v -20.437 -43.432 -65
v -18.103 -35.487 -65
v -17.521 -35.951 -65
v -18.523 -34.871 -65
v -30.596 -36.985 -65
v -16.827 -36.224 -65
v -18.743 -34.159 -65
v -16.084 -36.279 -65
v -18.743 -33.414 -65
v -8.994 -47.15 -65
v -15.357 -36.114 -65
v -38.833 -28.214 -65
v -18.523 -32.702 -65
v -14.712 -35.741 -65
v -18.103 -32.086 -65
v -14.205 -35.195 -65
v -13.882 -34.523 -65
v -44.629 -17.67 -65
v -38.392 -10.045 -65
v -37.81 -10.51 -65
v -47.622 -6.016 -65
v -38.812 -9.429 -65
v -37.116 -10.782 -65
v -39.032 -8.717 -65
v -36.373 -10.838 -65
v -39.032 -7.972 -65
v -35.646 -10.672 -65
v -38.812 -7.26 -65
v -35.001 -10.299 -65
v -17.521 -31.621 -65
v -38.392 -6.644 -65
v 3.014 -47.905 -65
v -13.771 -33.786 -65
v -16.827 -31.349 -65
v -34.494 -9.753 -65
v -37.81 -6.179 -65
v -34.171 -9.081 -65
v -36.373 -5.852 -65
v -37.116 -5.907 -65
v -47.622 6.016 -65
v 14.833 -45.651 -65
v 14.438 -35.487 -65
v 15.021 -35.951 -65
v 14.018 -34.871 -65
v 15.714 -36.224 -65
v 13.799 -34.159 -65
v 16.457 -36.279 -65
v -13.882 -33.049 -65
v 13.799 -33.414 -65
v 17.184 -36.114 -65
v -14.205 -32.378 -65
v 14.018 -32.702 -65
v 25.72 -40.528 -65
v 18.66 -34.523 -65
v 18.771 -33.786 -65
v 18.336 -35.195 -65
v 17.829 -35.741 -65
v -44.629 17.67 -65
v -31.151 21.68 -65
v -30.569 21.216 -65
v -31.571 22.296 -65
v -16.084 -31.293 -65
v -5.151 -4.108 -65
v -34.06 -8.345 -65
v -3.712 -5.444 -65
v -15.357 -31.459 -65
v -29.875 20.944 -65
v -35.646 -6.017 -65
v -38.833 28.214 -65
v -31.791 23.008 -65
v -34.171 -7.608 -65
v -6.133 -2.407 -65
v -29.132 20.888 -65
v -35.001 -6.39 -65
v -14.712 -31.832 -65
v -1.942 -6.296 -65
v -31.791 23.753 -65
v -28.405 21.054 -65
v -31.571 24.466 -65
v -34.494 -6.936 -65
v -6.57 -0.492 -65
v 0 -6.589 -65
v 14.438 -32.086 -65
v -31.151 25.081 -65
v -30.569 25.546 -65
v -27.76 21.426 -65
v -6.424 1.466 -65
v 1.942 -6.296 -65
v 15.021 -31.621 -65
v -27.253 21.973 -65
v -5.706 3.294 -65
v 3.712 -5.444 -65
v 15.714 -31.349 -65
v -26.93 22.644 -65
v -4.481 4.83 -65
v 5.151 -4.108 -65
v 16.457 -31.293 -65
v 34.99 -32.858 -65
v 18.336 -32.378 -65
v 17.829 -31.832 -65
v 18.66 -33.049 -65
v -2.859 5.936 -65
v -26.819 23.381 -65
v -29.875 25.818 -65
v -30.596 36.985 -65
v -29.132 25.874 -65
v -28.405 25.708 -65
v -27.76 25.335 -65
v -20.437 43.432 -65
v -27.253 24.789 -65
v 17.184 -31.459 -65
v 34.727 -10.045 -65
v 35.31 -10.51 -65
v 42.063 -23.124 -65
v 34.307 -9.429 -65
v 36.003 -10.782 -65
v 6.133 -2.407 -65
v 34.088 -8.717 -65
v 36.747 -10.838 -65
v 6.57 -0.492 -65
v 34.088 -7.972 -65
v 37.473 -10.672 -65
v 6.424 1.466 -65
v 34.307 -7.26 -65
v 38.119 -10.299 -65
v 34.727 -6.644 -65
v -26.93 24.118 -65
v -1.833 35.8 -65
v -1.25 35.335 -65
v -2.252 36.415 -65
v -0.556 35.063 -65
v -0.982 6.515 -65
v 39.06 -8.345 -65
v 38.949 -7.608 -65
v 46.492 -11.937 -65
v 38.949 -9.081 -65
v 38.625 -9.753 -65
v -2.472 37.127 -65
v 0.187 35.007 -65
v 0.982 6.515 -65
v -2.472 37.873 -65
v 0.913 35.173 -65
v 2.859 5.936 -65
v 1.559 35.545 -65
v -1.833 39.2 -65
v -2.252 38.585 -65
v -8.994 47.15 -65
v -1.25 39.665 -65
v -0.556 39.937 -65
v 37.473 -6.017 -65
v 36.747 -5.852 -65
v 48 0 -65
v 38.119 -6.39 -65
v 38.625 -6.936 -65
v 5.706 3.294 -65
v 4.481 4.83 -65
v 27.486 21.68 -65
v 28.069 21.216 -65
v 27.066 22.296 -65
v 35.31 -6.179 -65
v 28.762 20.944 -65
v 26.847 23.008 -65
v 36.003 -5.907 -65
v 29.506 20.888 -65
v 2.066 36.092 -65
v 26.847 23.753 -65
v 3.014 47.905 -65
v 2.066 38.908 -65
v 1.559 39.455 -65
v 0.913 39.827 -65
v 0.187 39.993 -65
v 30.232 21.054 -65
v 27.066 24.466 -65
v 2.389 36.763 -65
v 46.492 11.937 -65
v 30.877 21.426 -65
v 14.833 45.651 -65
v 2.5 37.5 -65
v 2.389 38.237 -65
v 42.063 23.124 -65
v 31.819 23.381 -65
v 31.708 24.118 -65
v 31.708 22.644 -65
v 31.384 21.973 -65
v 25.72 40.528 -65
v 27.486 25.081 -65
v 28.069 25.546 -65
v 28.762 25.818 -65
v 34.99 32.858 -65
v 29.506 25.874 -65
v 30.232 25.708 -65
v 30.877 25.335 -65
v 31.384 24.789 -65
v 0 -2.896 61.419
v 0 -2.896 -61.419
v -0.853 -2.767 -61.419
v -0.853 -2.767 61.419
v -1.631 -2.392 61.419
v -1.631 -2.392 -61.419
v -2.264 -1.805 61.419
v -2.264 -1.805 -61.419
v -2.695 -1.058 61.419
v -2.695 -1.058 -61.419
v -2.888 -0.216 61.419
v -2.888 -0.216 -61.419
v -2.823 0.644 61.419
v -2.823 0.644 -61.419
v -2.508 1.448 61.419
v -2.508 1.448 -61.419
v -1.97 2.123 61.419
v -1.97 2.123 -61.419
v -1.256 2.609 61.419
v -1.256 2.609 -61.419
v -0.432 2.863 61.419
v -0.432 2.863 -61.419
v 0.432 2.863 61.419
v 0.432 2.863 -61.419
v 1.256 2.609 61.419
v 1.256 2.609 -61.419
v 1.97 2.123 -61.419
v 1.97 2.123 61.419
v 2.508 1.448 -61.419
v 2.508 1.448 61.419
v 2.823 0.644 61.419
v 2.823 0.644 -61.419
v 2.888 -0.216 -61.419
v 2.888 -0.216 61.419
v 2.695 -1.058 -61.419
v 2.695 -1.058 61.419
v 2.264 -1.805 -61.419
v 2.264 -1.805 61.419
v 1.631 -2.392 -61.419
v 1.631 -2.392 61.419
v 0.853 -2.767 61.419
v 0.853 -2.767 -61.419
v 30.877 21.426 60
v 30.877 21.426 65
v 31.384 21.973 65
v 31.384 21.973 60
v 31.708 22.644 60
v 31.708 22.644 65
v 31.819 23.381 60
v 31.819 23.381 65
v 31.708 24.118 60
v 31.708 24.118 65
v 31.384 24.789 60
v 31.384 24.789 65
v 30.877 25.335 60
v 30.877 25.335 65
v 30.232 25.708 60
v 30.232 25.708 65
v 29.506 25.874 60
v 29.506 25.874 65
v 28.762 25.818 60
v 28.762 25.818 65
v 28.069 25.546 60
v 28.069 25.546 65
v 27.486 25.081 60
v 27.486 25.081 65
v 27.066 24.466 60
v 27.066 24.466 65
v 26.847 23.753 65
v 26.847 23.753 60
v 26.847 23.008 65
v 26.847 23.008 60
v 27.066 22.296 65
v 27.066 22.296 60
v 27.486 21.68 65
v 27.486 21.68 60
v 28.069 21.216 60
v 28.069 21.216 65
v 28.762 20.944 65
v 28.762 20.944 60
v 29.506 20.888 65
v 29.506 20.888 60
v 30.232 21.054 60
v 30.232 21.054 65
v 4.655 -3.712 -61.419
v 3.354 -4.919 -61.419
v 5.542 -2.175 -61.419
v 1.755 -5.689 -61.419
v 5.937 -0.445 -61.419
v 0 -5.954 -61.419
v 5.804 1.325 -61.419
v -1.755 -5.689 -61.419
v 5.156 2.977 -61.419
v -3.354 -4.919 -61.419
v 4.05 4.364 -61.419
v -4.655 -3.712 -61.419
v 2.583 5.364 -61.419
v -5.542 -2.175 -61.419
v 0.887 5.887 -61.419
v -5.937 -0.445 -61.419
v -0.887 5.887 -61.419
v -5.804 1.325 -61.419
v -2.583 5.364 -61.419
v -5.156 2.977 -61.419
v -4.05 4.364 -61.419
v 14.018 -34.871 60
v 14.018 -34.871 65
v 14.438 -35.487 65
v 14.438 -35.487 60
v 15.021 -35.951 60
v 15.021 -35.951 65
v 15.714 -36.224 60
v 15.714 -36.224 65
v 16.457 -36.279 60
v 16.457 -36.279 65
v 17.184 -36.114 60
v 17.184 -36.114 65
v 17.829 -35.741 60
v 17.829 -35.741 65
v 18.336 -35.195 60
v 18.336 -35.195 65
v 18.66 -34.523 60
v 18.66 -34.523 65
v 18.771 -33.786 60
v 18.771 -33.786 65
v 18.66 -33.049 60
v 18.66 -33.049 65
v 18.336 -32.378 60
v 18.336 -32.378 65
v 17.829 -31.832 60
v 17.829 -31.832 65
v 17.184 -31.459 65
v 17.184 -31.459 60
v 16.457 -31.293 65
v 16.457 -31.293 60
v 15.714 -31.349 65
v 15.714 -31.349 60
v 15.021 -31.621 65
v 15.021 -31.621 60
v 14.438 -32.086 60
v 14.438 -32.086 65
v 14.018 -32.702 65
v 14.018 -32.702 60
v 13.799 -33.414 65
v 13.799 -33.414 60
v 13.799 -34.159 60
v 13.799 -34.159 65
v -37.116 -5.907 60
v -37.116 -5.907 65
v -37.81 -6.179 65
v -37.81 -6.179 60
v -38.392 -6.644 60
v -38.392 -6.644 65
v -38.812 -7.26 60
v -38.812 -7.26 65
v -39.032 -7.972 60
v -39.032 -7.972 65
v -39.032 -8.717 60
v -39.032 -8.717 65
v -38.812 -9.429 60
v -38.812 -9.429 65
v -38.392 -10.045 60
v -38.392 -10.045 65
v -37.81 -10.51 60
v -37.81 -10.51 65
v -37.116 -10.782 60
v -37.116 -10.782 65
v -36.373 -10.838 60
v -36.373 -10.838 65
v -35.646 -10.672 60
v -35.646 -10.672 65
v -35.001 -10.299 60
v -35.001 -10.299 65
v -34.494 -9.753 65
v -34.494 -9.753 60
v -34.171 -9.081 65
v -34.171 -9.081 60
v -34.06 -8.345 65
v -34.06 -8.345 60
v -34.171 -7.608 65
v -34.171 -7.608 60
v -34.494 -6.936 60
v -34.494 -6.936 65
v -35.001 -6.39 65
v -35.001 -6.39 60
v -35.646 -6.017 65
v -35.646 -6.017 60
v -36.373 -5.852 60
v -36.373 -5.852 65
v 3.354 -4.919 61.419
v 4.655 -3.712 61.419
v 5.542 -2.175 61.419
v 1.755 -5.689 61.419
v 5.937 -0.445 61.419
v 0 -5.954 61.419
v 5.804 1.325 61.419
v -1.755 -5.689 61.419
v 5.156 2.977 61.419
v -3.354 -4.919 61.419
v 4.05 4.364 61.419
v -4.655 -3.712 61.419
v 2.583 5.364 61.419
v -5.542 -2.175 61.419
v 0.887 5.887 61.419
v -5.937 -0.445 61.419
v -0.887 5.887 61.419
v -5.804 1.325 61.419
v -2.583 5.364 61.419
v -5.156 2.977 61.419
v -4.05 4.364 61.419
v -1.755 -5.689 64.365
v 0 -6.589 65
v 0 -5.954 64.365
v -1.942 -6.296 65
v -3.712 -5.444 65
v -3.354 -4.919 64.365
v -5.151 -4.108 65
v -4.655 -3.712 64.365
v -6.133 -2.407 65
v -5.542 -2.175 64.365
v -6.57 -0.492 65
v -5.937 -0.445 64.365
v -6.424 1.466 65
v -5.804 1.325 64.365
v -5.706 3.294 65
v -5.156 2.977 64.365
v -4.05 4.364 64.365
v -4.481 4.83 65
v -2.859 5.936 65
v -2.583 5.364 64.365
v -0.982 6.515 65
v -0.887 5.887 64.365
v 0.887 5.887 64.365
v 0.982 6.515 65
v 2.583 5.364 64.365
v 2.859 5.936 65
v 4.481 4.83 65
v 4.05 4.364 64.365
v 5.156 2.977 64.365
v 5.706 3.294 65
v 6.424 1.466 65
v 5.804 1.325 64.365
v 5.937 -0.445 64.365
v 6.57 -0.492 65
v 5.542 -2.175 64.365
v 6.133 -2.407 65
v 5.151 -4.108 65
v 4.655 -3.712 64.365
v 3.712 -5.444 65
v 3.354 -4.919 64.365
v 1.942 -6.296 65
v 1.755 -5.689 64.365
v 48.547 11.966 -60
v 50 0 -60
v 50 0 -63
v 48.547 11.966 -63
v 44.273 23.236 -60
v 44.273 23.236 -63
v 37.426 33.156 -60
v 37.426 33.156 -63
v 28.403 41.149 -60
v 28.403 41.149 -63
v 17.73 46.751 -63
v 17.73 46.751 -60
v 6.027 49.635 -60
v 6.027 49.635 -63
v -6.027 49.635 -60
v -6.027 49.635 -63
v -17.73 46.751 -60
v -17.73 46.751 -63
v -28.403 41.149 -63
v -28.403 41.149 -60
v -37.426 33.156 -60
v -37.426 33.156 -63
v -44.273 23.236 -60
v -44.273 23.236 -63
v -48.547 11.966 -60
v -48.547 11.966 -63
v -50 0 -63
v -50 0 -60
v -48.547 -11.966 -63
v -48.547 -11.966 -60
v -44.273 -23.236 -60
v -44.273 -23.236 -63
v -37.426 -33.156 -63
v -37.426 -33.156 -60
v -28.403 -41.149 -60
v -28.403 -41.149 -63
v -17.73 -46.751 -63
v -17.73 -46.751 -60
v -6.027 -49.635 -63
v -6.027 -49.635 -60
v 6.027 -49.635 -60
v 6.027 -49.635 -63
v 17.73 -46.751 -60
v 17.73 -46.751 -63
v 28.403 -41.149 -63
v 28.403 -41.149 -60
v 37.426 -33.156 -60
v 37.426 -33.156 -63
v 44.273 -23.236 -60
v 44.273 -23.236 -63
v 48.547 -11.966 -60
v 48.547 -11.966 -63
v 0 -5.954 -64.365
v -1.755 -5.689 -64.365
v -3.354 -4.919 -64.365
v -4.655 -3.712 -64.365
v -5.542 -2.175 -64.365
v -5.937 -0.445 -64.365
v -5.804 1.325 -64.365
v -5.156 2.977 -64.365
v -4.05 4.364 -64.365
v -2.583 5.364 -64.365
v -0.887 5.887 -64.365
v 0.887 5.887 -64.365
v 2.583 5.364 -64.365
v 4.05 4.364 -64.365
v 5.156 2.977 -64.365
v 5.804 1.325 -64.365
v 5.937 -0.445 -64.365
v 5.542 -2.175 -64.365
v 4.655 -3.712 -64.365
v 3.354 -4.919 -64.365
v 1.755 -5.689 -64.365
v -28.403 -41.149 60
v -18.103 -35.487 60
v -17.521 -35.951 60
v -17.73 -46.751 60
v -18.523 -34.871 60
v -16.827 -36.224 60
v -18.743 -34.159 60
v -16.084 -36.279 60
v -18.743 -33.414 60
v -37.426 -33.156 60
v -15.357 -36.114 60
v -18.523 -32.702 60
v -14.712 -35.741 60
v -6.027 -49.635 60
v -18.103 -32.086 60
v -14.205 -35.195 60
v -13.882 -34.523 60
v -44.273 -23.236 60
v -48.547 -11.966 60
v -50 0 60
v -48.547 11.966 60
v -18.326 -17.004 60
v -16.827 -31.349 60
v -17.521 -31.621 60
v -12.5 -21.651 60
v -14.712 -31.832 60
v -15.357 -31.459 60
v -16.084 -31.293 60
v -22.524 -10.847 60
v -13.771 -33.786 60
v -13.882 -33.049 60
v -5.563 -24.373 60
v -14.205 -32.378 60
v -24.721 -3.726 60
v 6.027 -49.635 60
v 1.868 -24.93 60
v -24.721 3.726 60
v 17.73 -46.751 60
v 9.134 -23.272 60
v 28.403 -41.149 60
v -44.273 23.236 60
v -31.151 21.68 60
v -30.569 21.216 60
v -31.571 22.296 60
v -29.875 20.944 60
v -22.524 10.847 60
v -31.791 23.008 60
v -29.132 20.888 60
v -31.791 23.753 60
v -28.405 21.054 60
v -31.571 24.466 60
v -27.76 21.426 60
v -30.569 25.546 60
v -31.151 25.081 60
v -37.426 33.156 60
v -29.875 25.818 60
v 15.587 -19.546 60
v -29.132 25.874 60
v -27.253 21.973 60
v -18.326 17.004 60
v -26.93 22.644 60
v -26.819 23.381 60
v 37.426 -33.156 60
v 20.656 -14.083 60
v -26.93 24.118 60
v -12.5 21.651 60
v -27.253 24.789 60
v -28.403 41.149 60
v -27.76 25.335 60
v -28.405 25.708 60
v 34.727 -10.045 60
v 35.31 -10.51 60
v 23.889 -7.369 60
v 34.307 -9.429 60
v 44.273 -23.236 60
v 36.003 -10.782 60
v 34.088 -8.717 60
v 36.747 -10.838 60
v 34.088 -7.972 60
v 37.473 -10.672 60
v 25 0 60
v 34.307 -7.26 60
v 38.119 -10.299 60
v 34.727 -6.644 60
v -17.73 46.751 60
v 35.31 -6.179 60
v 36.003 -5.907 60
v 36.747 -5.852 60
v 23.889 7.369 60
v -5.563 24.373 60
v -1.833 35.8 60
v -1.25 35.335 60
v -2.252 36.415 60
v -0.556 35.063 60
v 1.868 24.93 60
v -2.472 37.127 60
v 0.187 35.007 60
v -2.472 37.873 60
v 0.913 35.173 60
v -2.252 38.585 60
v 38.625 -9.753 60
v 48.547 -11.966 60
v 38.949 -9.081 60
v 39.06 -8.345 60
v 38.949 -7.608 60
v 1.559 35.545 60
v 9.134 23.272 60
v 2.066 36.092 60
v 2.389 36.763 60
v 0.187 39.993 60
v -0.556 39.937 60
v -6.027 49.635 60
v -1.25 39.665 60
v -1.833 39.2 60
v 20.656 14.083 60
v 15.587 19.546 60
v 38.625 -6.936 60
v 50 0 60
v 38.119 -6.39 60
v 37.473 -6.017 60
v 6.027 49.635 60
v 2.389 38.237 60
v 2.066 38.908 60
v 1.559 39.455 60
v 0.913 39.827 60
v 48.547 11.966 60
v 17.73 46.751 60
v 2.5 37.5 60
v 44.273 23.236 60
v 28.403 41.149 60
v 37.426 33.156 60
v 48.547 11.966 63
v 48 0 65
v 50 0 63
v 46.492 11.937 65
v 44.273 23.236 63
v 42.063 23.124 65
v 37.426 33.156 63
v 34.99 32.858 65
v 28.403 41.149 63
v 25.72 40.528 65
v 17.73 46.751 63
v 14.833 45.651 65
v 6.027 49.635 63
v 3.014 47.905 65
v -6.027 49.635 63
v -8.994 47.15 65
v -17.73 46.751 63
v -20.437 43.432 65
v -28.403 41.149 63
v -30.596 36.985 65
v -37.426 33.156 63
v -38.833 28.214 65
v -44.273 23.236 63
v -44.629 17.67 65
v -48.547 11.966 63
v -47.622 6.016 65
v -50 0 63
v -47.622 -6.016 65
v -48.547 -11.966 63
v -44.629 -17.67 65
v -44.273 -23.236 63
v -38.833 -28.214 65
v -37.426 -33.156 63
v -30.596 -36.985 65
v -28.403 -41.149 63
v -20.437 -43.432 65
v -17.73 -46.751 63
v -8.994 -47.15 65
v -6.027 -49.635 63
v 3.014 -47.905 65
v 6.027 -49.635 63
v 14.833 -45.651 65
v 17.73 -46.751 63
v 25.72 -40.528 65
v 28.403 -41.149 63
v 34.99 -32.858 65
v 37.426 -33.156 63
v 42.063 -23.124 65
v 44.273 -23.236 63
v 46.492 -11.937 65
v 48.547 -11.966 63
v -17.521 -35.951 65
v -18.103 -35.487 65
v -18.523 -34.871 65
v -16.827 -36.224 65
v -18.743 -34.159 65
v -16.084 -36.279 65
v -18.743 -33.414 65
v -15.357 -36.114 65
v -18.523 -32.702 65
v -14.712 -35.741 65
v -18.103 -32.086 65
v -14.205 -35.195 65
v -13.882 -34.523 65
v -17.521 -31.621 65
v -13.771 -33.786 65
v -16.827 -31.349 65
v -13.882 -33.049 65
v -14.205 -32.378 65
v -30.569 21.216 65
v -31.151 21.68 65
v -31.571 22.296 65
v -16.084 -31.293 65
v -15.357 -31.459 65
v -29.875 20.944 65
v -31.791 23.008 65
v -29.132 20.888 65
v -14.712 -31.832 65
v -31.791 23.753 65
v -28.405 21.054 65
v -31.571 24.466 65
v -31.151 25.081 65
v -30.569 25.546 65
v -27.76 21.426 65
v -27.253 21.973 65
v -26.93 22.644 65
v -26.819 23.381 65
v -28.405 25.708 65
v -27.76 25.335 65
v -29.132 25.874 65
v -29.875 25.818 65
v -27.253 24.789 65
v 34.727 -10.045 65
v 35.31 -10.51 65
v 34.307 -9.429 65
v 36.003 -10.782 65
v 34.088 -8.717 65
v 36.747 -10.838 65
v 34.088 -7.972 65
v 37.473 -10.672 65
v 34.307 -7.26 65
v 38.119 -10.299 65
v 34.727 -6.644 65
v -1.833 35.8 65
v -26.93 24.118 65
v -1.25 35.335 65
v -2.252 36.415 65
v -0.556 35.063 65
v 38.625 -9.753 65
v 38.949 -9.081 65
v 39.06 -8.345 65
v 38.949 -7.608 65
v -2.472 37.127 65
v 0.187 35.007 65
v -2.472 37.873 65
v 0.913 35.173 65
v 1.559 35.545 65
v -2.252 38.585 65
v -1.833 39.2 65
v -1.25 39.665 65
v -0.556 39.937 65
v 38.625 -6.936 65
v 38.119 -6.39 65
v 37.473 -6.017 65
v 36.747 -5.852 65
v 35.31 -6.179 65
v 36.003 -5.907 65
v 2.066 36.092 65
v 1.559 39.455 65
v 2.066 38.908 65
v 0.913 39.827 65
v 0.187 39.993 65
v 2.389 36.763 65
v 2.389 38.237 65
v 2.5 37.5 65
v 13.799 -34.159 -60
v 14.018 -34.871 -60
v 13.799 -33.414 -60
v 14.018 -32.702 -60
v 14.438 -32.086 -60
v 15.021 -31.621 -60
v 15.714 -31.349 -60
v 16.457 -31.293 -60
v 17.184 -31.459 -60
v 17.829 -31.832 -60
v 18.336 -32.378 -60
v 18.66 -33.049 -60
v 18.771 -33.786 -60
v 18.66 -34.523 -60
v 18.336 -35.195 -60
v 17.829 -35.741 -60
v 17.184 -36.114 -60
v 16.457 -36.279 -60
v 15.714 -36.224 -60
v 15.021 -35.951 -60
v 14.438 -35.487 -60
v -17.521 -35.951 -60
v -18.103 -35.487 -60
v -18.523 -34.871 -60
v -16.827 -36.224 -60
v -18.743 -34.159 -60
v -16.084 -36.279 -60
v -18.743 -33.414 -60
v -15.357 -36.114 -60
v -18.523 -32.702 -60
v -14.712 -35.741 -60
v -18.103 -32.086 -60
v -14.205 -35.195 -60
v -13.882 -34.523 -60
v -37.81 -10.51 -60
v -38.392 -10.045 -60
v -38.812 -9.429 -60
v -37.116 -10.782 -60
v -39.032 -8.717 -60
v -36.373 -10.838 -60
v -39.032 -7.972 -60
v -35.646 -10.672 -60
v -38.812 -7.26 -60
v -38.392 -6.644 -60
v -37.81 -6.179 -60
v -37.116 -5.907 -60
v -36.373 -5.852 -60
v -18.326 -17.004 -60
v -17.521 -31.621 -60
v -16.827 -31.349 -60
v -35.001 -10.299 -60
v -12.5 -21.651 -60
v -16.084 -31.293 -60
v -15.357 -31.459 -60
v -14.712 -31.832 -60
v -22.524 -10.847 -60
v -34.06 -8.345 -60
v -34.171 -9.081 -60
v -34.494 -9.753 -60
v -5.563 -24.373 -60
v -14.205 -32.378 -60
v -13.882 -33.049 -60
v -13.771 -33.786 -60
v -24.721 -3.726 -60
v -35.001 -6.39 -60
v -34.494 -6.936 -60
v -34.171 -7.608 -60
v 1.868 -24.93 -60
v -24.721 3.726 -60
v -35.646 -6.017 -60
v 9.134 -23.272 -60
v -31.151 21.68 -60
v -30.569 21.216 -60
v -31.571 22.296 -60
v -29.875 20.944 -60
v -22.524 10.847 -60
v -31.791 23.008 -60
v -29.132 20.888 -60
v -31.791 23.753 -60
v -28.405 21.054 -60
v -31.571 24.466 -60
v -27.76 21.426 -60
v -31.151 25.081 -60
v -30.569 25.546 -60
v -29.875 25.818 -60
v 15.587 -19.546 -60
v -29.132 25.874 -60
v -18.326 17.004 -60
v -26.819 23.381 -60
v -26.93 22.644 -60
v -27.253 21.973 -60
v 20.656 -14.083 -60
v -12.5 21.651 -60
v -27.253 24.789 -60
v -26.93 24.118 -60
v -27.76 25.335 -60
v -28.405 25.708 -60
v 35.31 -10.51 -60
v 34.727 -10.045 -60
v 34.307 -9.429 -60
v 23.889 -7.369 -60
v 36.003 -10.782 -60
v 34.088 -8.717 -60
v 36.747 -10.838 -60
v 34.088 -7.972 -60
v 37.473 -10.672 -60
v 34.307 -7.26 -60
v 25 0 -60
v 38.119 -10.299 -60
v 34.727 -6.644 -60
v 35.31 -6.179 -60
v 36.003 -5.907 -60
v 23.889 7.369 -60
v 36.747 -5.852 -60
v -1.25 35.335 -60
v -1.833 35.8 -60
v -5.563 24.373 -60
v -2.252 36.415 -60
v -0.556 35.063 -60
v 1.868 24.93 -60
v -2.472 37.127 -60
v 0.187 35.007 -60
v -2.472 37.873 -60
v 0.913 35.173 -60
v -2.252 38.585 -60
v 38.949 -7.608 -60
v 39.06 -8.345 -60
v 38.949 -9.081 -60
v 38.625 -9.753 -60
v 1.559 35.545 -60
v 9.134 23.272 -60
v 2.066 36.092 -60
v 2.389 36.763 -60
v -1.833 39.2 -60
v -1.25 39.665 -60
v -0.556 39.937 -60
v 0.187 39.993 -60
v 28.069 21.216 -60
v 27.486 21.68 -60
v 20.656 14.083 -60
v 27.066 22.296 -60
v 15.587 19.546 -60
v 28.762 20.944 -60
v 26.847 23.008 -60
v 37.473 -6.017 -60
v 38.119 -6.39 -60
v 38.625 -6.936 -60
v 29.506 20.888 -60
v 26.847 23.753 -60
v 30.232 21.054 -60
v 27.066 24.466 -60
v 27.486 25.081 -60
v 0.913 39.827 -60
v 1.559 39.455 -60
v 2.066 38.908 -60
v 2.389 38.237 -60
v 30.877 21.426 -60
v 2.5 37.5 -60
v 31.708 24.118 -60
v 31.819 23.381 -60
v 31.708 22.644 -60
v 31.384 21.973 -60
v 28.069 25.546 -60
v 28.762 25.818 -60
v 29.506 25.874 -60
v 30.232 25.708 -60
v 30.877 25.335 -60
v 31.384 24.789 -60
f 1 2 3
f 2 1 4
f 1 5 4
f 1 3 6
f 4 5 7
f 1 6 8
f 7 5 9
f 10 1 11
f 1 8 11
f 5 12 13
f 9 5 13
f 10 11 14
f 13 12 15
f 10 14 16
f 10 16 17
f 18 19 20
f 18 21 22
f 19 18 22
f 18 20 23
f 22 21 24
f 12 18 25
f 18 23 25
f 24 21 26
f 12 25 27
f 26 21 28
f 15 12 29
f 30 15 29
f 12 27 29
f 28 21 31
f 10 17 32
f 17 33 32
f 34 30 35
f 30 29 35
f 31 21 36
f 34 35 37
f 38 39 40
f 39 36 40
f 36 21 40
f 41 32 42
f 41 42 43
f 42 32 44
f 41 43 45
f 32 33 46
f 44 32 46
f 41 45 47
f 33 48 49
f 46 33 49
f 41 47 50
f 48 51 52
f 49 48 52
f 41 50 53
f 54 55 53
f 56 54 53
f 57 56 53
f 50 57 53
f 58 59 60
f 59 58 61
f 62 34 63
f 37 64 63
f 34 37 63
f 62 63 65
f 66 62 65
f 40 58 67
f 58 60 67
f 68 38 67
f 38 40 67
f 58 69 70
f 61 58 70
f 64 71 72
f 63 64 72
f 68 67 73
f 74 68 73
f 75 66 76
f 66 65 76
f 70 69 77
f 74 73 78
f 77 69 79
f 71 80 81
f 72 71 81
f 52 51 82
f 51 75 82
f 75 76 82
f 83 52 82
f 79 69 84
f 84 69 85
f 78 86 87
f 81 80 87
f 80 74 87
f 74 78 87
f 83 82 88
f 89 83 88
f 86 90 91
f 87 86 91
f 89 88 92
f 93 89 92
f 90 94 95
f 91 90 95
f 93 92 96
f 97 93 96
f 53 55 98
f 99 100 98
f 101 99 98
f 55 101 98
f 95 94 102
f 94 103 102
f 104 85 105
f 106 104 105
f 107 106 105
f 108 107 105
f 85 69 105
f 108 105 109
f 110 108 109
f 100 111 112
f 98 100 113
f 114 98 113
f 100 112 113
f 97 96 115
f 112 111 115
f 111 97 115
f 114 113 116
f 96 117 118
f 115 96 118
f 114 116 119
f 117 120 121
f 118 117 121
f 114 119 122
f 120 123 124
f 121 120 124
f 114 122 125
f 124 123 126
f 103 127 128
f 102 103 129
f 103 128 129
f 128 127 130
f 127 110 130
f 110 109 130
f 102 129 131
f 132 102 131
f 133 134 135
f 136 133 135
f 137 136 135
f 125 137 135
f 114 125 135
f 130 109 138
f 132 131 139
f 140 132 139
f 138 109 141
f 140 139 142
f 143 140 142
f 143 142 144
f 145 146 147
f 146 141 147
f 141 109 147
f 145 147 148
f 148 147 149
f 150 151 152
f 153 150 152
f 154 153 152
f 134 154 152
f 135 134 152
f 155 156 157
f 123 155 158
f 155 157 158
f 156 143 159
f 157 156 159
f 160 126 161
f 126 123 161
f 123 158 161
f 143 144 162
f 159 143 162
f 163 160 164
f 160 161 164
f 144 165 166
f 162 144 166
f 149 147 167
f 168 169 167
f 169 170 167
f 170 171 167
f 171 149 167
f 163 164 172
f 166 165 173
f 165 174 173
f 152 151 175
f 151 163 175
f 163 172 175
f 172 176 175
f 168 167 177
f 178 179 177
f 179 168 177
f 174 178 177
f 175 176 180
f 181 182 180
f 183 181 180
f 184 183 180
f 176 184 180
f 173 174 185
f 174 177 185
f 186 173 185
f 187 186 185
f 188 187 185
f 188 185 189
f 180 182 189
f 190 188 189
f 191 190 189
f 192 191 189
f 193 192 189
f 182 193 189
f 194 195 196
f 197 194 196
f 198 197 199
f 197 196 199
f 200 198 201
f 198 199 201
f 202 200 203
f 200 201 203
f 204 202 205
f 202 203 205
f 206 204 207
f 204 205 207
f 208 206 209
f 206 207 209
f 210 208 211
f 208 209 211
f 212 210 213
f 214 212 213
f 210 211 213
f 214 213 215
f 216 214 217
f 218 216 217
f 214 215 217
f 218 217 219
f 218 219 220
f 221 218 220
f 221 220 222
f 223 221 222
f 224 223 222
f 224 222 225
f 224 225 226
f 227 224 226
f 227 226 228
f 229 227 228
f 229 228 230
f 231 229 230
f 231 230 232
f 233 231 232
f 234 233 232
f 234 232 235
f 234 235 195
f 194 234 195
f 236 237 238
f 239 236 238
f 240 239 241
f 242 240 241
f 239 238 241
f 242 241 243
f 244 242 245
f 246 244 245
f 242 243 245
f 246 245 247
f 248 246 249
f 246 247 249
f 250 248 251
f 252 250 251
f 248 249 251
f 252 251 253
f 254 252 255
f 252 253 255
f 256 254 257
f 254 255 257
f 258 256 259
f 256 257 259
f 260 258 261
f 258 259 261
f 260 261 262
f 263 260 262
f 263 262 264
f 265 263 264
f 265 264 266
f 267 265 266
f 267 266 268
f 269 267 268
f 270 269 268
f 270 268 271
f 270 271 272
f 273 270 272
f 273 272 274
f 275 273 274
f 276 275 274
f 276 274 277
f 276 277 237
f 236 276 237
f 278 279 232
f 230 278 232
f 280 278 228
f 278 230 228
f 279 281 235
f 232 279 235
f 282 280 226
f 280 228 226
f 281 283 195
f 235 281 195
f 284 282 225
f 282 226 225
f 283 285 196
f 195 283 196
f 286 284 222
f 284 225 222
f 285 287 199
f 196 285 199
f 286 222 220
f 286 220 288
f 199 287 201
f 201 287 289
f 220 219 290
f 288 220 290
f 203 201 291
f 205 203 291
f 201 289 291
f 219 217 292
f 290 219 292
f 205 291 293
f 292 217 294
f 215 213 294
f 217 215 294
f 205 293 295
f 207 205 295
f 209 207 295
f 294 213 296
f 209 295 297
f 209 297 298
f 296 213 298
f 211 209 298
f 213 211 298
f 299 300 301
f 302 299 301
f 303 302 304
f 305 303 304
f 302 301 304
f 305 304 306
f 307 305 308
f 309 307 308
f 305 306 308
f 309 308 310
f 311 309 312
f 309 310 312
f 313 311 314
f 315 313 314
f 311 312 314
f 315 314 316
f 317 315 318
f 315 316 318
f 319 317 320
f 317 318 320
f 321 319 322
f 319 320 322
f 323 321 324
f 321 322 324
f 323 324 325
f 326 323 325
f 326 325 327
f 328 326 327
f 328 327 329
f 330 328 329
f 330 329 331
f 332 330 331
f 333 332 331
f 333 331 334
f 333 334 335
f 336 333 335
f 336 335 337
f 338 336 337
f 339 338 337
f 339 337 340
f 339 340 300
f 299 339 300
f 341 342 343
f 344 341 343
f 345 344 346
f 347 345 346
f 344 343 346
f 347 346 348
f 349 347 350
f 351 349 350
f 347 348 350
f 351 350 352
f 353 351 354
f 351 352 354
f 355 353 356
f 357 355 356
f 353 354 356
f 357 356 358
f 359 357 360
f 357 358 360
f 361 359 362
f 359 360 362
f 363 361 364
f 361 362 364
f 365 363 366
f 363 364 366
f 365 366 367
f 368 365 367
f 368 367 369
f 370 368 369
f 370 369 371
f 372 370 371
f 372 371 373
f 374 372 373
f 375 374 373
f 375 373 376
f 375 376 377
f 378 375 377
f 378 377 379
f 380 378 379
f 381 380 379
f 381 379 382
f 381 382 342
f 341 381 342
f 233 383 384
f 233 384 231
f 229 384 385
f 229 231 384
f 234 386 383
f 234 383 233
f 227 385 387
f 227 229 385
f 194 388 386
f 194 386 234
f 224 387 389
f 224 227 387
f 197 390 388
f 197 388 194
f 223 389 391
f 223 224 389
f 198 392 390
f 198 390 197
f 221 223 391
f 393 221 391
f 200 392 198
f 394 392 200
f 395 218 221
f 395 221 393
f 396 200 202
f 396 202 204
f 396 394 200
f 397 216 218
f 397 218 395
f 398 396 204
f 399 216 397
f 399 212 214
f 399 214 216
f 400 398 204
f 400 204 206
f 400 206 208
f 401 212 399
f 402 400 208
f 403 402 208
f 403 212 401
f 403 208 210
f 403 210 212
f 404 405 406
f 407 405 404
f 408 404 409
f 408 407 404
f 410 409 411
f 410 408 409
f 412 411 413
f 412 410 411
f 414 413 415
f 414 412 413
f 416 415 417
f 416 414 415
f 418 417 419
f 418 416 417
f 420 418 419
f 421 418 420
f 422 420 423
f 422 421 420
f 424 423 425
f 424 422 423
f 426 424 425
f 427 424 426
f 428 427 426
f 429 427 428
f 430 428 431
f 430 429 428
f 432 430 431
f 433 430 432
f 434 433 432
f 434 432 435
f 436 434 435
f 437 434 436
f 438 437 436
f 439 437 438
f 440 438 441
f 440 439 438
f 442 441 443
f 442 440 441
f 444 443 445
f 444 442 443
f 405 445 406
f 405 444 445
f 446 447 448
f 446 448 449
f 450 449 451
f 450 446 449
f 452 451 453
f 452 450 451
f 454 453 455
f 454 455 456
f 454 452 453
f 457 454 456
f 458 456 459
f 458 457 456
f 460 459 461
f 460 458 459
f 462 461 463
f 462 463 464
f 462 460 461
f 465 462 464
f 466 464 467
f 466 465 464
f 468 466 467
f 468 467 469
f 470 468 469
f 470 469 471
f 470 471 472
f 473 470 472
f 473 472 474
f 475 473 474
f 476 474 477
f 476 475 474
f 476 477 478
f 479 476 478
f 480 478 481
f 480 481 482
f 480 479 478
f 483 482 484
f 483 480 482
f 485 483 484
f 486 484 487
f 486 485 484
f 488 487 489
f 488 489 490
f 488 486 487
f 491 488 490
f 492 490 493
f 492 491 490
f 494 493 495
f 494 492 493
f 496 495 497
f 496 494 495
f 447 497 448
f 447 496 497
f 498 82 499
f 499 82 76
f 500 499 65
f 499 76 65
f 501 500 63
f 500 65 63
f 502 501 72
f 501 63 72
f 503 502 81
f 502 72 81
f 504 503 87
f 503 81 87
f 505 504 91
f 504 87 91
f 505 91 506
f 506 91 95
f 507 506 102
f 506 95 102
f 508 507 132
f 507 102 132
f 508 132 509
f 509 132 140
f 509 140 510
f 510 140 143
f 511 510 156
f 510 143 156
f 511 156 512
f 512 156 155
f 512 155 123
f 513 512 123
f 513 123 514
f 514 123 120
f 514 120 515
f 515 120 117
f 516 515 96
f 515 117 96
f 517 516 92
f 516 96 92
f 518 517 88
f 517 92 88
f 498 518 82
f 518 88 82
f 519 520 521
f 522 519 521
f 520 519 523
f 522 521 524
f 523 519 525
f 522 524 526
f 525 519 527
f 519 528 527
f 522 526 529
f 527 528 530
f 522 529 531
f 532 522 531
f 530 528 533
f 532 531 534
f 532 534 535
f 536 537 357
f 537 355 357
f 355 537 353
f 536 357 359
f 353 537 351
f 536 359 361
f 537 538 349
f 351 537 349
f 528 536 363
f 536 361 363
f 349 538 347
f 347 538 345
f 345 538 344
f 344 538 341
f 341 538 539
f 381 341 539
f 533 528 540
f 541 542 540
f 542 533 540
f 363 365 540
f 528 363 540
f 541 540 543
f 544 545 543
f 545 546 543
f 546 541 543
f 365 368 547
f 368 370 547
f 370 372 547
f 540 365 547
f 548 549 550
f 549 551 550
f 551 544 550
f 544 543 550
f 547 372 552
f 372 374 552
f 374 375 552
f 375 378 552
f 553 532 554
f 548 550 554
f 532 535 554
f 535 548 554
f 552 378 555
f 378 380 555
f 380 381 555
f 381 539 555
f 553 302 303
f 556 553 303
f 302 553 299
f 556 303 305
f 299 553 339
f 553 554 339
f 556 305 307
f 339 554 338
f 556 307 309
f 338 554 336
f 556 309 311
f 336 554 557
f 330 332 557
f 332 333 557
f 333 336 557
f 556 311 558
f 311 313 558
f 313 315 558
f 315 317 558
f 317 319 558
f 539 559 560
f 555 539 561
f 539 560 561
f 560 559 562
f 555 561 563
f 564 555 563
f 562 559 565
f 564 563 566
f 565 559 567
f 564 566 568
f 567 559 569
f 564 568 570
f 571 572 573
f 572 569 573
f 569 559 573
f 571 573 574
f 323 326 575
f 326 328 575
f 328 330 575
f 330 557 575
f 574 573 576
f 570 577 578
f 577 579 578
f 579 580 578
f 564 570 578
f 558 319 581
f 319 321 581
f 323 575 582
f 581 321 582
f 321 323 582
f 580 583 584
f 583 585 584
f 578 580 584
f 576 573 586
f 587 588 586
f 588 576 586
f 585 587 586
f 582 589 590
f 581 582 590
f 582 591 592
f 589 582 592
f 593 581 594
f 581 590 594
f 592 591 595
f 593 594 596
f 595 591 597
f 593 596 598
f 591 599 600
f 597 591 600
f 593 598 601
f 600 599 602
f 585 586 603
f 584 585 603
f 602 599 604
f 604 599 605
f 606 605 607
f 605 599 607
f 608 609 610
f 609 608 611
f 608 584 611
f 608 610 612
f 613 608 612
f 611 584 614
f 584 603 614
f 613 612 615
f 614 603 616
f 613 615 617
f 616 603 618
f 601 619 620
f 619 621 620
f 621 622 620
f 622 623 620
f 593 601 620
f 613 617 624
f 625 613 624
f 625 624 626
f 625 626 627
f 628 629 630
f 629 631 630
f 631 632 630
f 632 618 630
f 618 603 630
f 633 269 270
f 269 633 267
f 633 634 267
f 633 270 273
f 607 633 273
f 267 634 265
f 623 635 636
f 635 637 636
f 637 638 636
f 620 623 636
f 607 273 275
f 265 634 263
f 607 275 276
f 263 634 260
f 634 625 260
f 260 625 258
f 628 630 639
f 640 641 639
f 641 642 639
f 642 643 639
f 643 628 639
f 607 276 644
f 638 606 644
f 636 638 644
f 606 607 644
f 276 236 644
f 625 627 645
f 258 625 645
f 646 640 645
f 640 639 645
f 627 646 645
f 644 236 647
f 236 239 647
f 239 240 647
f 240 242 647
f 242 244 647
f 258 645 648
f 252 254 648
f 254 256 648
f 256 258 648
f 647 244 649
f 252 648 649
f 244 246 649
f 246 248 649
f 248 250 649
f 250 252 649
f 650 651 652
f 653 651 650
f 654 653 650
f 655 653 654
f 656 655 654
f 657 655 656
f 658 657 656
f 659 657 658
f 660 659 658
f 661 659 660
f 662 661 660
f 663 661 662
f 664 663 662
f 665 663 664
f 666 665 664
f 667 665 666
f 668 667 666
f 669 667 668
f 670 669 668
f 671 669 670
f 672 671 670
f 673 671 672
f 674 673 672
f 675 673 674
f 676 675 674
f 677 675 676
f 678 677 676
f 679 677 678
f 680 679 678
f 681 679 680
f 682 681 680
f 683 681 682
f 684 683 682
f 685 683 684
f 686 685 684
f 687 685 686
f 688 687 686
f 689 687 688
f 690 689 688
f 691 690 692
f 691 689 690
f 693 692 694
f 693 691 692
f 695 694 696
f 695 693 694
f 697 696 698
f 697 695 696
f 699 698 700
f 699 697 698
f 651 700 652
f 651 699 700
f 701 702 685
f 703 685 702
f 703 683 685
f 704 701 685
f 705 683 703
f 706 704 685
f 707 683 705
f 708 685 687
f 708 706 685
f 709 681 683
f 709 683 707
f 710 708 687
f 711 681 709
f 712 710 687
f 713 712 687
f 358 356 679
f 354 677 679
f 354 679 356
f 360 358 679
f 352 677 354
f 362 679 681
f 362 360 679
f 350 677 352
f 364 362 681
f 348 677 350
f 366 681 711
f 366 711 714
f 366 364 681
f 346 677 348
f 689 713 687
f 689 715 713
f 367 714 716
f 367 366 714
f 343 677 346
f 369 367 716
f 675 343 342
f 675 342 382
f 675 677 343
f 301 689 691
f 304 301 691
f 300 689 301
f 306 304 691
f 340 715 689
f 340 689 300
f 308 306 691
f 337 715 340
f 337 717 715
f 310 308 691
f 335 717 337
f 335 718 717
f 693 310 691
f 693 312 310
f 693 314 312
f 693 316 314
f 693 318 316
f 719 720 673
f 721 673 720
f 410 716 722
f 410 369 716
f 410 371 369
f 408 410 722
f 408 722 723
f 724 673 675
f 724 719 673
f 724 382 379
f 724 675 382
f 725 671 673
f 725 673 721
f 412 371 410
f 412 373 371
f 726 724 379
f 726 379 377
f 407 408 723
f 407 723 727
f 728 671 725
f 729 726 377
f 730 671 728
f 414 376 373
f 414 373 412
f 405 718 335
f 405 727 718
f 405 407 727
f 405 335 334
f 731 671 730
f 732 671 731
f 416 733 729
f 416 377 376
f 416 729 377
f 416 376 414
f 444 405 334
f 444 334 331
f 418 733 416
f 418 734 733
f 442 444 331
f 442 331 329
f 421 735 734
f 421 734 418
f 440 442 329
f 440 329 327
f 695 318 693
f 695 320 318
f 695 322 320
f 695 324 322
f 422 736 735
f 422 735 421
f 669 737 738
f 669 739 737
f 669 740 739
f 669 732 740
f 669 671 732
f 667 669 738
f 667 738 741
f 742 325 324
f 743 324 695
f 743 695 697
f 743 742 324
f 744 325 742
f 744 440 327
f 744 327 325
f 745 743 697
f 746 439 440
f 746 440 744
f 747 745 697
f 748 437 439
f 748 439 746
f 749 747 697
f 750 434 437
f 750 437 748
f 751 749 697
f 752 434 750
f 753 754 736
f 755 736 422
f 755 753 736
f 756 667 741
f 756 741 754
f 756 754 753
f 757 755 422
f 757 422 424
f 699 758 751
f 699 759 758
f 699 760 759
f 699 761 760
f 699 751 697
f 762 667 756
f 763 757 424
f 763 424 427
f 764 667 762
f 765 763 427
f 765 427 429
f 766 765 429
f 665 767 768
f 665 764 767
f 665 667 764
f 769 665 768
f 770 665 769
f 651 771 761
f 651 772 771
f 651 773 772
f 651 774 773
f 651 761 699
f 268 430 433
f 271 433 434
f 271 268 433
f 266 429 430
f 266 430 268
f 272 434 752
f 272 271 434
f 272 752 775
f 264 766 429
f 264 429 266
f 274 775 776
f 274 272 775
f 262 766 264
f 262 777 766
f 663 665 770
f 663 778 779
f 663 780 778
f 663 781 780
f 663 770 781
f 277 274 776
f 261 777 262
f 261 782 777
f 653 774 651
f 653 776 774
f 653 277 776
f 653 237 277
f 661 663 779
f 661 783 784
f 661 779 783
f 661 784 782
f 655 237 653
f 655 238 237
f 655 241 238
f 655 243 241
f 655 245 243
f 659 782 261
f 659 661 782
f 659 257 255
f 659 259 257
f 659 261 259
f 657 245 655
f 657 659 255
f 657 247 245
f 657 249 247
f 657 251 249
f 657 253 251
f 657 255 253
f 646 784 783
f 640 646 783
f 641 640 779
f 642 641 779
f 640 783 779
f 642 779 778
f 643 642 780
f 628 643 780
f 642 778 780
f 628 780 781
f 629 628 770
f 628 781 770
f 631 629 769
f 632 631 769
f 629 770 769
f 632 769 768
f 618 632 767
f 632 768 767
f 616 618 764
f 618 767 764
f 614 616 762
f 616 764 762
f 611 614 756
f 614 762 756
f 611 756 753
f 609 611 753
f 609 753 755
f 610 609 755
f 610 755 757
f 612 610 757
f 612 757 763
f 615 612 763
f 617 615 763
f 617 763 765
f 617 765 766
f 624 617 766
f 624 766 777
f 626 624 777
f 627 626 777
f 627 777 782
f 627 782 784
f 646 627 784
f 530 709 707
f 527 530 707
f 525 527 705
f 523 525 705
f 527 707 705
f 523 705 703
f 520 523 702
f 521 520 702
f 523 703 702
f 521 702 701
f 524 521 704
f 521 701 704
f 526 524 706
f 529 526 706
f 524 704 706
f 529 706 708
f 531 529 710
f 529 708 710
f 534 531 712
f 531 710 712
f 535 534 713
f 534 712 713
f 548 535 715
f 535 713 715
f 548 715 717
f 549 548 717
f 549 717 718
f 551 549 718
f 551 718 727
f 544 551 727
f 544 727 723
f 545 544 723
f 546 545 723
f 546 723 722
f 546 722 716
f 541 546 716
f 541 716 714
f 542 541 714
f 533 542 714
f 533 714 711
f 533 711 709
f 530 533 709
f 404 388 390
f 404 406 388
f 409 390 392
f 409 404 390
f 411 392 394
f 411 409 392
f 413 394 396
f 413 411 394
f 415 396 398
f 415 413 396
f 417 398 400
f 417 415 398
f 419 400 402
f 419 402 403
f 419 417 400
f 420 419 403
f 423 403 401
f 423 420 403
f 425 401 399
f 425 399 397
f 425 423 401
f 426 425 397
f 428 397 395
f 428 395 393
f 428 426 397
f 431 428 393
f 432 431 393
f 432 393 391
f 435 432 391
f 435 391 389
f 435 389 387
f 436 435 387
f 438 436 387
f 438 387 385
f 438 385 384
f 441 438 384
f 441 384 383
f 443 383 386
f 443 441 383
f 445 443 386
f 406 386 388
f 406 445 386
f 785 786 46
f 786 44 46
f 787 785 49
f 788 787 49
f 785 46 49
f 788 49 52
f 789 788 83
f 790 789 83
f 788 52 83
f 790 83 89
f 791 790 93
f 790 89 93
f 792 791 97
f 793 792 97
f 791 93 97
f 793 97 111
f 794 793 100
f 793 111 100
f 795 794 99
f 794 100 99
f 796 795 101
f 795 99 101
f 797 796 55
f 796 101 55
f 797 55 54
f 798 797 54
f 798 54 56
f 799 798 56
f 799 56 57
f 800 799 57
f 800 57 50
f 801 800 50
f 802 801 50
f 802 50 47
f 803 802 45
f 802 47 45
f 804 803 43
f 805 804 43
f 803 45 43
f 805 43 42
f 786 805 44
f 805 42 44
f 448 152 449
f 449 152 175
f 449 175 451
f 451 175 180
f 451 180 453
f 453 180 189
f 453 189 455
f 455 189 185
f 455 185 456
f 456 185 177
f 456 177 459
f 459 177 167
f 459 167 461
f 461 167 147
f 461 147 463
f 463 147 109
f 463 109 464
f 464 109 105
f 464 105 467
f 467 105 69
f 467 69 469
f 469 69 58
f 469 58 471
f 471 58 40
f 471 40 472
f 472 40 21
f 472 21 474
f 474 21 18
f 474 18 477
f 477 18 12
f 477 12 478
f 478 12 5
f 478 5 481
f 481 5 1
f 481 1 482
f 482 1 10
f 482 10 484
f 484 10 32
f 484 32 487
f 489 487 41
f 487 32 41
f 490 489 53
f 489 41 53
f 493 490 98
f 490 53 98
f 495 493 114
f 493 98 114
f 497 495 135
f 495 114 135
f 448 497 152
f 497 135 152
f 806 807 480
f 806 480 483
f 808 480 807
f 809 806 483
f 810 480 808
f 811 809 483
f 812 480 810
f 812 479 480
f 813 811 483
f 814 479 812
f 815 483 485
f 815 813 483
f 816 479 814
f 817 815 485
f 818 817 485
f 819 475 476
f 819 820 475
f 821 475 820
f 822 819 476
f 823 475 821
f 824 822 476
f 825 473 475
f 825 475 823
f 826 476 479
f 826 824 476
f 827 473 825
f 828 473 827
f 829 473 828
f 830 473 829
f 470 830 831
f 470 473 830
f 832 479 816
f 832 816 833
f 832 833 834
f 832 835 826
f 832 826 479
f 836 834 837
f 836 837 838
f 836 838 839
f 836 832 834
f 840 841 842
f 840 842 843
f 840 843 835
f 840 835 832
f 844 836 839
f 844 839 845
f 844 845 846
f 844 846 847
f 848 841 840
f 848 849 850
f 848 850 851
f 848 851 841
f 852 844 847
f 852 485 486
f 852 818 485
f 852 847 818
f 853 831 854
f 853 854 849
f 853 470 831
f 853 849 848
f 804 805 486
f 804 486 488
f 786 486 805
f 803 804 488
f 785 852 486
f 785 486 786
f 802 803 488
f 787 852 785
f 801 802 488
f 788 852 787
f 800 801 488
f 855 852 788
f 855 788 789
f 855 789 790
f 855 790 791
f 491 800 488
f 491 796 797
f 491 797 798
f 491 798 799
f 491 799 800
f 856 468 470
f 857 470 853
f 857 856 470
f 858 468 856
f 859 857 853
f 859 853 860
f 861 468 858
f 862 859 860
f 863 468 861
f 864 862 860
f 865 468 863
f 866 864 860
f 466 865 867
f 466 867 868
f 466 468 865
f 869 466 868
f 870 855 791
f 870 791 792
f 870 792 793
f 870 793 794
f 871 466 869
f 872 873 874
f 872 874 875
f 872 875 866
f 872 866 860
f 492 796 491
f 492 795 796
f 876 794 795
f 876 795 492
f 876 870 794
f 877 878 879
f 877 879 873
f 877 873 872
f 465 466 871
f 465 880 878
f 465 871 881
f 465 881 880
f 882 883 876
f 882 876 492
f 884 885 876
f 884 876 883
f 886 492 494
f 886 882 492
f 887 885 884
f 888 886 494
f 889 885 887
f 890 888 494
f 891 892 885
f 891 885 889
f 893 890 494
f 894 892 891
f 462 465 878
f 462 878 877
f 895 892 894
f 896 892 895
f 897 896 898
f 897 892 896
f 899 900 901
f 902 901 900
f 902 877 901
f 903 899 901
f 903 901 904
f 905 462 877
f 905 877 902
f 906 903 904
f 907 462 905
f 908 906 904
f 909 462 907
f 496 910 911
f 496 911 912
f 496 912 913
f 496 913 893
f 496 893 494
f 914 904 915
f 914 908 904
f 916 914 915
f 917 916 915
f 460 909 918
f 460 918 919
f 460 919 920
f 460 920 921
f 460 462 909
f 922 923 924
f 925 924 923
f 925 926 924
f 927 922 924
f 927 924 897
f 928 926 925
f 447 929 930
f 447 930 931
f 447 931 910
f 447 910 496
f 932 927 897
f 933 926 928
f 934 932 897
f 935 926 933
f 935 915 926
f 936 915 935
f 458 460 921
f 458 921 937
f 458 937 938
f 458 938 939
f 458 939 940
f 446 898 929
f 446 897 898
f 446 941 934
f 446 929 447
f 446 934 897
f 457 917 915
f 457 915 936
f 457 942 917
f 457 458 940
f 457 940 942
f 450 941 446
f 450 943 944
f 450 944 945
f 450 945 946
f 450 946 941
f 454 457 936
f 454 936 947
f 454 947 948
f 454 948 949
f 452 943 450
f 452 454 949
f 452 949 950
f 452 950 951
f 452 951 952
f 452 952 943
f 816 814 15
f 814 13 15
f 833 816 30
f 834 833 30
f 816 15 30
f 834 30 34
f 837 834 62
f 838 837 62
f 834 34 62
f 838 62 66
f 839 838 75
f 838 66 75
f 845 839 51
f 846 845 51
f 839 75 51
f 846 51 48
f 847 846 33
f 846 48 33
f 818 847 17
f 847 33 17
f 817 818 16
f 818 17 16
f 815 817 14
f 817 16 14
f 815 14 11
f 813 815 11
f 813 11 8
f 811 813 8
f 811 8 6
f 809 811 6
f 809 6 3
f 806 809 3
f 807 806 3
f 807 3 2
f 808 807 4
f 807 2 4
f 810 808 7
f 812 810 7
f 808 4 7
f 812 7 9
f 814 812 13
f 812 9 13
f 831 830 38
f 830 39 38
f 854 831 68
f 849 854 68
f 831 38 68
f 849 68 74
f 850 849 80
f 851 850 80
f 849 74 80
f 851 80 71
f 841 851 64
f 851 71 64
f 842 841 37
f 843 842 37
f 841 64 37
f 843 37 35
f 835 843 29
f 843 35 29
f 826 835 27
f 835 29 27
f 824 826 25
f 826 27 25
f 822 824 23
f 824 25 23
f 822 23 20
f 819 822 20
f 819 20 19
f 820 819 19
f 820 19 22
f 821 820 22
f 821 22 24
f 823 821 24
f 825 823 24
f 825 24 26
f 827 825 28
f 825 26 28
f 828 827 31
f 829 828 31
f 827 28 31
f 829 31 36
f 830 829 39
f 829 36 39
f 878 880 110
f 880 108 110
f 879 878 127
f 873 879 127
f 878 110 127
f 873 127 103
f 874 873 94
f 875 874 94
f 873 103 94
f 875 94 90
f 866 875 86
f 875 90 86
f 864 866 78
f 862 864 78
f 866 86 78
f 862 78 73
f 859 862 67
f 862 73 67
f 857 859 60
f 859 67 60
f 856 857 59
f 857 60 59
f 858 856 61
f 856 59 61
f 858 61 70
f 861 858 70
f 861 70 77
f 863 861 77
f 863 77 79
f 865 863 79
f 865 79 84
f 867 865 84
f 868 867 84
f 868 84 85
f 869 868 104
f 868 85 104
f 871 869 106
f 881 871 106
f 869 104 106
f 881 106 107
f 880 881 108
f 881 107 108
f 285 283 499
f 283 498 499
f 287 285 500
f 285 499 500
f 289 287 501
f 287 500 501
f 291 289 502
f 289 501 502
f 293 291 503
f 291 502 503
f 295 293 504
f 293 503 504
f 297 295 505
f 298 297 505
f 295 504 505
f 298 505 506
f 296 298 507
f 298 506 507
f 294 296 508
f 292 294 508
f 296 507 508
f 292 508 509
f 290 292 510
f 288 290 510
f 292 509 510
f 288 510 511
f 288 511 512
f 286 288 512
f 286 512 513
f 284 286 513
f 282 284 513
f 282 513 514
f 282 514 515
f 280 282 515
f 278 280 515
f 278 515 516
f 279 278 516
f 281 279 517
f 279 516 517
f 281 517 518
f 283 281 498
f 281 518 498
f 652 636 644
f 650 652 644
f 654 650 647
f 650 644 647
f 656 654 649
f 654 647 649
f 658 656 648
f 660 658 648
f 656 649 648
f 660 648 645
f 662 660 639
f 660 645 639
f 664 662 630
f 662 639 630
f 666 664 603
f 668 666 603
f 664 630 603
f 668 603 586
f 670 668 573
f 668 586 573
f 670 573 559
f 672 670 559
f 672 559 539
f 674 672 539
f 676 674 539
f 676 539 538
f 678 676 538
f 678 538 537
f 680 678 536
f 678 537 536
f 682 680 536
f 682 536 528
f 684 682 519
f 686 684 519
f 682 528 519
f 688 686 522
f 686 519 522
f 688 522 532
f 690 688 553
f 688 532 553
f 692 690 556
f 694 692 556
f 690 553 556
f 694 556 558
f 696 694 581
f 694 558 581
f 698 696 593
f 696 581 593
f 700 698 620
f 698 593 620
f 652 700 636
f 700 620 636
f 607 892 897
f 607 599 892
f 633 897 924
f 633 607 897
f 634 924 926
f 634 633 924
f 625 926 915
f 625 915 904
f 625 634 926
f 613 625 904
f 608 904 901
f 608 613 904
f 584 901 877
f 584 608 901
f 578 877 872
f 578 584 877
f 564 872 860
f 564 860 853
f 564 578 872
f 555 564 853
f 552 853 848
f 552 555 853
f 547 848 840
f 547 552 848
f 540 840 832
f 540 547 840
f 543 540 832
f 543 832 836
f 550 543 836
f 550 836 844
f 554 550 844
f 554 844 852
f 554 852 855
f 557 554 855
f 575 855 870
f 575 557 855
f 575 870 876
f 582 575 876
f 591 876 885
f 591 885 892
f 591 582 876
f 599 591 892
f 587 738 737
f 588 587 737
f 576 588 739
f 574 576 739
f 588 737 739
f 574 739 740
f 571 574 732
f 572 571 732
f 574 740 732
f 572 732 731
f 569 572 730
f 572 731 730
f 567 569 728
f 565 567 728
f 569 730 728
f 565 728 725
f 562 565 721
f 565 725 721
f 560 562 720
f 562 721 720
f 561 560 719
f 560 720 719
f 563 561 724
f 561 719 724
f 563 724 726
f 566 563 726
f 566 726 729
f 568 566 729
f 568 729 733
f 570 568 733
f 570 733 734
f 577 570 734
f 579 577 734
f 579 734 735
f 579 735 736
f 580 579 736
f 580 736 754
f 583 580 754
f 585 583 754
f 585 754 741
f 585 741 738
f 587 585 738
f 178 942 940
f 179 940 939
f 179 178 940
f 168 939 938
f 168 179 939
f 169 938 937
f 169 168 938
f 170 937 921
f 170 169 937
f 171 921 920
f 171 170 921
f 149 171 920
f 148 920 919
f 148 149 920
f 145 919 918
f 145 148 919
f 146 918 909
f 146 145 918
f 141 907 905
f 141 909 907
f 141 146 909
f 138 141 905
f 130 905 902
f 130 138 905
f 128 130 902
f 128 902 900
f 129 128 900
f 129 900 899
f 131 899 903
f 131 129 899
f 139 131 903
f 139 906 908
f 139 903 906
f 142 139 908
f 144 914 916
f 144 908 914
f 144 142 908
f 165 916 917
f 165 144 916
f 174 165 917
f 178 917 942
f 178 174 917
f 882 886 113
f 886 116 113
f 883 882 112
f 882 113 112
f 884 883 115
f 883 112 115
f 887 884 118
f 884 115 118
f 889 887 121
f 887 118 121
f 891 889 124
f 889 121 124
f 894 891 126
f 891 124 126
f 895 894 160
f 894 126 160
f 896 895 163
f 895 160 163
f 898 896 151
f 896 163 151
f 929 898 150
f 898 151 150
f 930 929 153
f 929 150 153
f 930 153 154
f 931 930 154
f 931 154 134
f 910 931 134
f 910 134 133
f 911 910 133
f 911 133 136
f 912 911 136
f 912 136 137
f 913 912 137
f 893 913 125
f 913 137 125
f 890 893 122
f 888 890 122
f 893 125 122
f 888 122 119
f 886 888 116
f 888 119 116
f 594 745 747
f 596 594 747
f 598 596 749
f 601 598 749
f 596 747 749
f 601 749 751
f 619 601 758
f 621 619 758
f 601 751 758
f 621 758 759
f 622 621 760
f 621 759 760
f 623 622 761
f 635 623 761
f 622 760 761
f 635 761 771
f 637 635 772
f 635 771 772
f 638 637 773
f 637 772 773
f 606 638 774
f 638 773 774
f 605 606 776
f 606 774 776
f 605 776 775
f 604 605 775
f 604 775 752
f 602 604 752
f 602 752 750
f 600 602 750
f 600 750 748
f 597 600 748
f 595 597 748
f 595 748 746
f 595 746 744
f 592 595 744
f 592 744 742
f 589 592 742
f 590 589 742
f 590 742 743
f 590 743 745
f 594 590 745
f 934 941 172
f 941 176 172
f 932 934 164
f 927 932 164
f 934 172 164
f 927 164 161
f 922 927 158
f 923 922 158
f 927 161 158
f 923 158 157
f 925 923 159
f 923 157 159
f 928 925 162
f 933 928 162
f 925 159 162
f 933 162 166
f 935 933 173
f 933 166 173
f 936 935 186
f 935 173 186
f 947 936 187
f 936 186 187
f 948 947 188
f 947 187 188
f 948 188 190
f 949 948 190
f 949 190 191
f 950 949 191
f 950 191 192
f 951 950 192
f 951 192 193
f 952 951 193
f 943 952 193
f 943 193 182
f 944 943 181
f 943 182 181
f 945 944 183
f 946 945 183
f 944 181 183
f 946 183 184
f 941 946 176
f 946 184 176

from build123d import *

# Parameters (mm, degrees)
SKETCH2_R                = 25
BOSS_EXTRUDE1_DEPTH      = 60
SKETCH3_R                = 50
BOSS_EXTRUDE2_DEPTH      = 5
CHAMFER1_SIZE            = 2
SKETCH4_R                = 2.5
CUT_EXTRUDE1_DEPTH       = 144.614066163
CIRPATTERN1_COUNT        = 7
MIRROR1_COPY_1_SKETCH_R  = 2.5
MIRROR1_COPY_1_DEPTH     = 144.614066163
MIRROR1_COPY_2_SKETCH_R  = 2.5
MIRROR1_COPY_2_DEPTH     = 144.614066163
MIRROR1_COPY_3_SKETCH_R  = 2.5
MIRROR1_COPY_3_DEPTH     = 144.614066163
MIRROR1_COPY_4_SKETCH_R  = 2.5
MIRROR1_COPY_4_DEPTH     = 144.614066163
MIRROR1_COPY_5_SKETCH_R  = 2.5
MIRROR1_COPY_5_DEPTH     = 144.614066163
MIRROR1_COPY_6_SKETCH_R  = 2.5
MIRROR1_COPY_6_DEPTH     = 144.614066163
CHAMFER1_OF_MIRROR1_SIZE = 2


with BuildPart() as part:
    # Sketch2 → Boss-Extrude1 (new, symmetric)
    with BuildSketch(Plane.XY):
        Circle(SKETCH2_R)
    extrude(amount=BOSS_EXTRUDE1_DEPTH, both=True)

    # Sketch3 → Boss-Extrude2 (add)
    with BuildSketch(Plane.XY.offset(60)):
        Circle(SKETCH3_R)
    boss_extrude2 = extrude(amount=BOSS_EXTRUDE2_DEPTH)

    # Chamfer1
    chamfer1_edges = [part.edges().sort_by_distance(p)[0] for p in [
        (-50, 0, 65),
    ]]
    chamfer(chamfer1_edges, length=CHAMFER1_SIZE)

    # Sketch4 → Cut-Extrude1 (cut, through all)
    with BuildSketch(Plane.XY.offset(65)):
        with Locations((0, 37.5)):
            Circle(SKETCH4_R)
    cut_extrude1 = extrude(amount=-CUT_EXTRUDE1_DEPTH, mode=Mode.SUBTRACT)

    # CirPattern1: Cut-Extrude1 ×7 about axis
    cirpattern1_axis = Axis((0, 0, 0), (0, 0, 1))
    for i in range(1, CIRPATTERN1_COUNT):
        add(cut_extrude1.rotate(cirpattern1_axis, i * 360 / CIRPATTERN1_COUNT), mode=Mode.SUBTRACT)

    # Sketch6 → CBORE for #12 Binding Head Machine Screw1 (revolve, cut)
    with BuildSketch(Plane(origin=(0, 0, 65), x_dir=(0, -1, 0), z_dir=(1, 0, 0))):
        Polygon((0, 0), (0, 130), (2.8956, 130), (2.8956, 3.5814), (5.95376, 3.5814), (5.95376, 0.635), (6.58876, 0), align=None)
    cbore_for_12_binding_head_machine_screw = revolve(axis=Axis((0, 0, 71.35), (0, 0, -1)), mode=Mode.SUBTRACT)

    # Mirror1: Boss-Extrude2, Cut-Extrude1, CBORE for #12 Binding Head Machine Screw1 across plane
    add(boss_extrude2.mirror(Plane.XY))
    add(cut_extrude1.mirror(Plane.XY), mode=Mode.SUBTRACT)
    add(cbore_for_12_binding_head_machine_screw.mirror(Plane.XY), mode=Mode.SUBTRACT)

    # Mirror1 copy 1 sketch → Mirror1 copy 1 (cut, through all)
    with BuildSketch(Plane(origin=(0, 0, -65), x_dir=(0.6234898018587336, 0.7818314824680298, 0), z_dir=(0, 0, -1))):
        with Locations((0, -37.5)):
            Circle(MIRROR1_COPY_1_SKETCH_R)
    extrude(amount=-MIRROR1_COPY_1_DEPTH, mode=Mode.SUBTRACT)

    # Mirror1 copy 2 sketch → Mirror1 copy 2 (cut, through all)
    with BuildSketch(Plane(origin=(0, 0, -65), x_dir=(-0.22252093395631434, 0.9749279121818236, 0), z_dir=(0, 0, -1))):
        with Locations((0, -37.5)):
            Circle(MIRROR1_COPY_2_SKETCH_R)
    extrude(amount=-MIRROR1_COPY_2_DEPTH, mode=Mode.SUBTRACT)

    # Mirror1 copy 3 sketch → Mirror1 copy 3 (cut, through all)
    with BuildSketch(Plane(origin=(0, 0, -65), x_dir=(-0.900968867902419, 0.43388373911755823, 0), z_dir=(0, 0, -1))):
        with Locations((0, -37.5)):
            Circle(MIRROR1_COPY_3_SKETCH_R)
    extrude(amount=-MIRROR1_COPY_3_DEPTH, mode=Mode.SUBTRACT)

    # Mirror1 copy 4 sketch → Mirror1 copy 4 (cut, through all)
    with BuildSketch(Plane(origin=(0, 0, -65), x_dir=(-0.9009688679024191, -0.433883739117558, 0), z_dir=(0, 0, -1))):
        with Locations((0, -37.5)):
            Circle(MIRROR1_COPY_4_SKETCH_R)
    extrude(amount=-MIRROR1_COPY_4_DEPTH, mode=Mode.SUBTRACT)

    # Mirror1 copy 5 sketch → Mirror1 copy 5 (cut, through all)
    with BuildSketch(Plane(origin=(0, 0, -65), x_dir=(-0.2225209339563137, -0.9749279121818237, 0), z_dir=(0, 0, -1))):
        with Locations((0, -37.5)):
            Circle(MIRROR1_COPY_5_SKETCH_R)
    extrude(amount=-MIRROR1_COPY_5_DEPTH, mode=Mode.SUBTRACT)

    # Mirror1 copy 6 sketch → Mirror1 copy 6 (cut, through all)
    with BuildSketch(Plane(origin=(0, 0, -65), x_dir=(0.6234898018587334, -0.7818314824680299, 0), z_dir=(0, 0, -1))):
        with Locations((0, -37.5)):
            Circle(MIRROR1_COPY_6_SKETCH_R)
    extrude(amount=-MIRROR1_COPY_6_DEPTH, mode=Mode.SUBTRACT)

    # Chamfer1 of Mirror1
    chamfer1_of_mirror1_edges = [part.edges().sort_by_distance(p)[0] for p in [
        (-50, 0, -65),
    ]]
    chamfer(chamfer1_of_mirror1_edges, length=CHAMFER1_OF_MIRROR1_SIZE)


solid = part.part
